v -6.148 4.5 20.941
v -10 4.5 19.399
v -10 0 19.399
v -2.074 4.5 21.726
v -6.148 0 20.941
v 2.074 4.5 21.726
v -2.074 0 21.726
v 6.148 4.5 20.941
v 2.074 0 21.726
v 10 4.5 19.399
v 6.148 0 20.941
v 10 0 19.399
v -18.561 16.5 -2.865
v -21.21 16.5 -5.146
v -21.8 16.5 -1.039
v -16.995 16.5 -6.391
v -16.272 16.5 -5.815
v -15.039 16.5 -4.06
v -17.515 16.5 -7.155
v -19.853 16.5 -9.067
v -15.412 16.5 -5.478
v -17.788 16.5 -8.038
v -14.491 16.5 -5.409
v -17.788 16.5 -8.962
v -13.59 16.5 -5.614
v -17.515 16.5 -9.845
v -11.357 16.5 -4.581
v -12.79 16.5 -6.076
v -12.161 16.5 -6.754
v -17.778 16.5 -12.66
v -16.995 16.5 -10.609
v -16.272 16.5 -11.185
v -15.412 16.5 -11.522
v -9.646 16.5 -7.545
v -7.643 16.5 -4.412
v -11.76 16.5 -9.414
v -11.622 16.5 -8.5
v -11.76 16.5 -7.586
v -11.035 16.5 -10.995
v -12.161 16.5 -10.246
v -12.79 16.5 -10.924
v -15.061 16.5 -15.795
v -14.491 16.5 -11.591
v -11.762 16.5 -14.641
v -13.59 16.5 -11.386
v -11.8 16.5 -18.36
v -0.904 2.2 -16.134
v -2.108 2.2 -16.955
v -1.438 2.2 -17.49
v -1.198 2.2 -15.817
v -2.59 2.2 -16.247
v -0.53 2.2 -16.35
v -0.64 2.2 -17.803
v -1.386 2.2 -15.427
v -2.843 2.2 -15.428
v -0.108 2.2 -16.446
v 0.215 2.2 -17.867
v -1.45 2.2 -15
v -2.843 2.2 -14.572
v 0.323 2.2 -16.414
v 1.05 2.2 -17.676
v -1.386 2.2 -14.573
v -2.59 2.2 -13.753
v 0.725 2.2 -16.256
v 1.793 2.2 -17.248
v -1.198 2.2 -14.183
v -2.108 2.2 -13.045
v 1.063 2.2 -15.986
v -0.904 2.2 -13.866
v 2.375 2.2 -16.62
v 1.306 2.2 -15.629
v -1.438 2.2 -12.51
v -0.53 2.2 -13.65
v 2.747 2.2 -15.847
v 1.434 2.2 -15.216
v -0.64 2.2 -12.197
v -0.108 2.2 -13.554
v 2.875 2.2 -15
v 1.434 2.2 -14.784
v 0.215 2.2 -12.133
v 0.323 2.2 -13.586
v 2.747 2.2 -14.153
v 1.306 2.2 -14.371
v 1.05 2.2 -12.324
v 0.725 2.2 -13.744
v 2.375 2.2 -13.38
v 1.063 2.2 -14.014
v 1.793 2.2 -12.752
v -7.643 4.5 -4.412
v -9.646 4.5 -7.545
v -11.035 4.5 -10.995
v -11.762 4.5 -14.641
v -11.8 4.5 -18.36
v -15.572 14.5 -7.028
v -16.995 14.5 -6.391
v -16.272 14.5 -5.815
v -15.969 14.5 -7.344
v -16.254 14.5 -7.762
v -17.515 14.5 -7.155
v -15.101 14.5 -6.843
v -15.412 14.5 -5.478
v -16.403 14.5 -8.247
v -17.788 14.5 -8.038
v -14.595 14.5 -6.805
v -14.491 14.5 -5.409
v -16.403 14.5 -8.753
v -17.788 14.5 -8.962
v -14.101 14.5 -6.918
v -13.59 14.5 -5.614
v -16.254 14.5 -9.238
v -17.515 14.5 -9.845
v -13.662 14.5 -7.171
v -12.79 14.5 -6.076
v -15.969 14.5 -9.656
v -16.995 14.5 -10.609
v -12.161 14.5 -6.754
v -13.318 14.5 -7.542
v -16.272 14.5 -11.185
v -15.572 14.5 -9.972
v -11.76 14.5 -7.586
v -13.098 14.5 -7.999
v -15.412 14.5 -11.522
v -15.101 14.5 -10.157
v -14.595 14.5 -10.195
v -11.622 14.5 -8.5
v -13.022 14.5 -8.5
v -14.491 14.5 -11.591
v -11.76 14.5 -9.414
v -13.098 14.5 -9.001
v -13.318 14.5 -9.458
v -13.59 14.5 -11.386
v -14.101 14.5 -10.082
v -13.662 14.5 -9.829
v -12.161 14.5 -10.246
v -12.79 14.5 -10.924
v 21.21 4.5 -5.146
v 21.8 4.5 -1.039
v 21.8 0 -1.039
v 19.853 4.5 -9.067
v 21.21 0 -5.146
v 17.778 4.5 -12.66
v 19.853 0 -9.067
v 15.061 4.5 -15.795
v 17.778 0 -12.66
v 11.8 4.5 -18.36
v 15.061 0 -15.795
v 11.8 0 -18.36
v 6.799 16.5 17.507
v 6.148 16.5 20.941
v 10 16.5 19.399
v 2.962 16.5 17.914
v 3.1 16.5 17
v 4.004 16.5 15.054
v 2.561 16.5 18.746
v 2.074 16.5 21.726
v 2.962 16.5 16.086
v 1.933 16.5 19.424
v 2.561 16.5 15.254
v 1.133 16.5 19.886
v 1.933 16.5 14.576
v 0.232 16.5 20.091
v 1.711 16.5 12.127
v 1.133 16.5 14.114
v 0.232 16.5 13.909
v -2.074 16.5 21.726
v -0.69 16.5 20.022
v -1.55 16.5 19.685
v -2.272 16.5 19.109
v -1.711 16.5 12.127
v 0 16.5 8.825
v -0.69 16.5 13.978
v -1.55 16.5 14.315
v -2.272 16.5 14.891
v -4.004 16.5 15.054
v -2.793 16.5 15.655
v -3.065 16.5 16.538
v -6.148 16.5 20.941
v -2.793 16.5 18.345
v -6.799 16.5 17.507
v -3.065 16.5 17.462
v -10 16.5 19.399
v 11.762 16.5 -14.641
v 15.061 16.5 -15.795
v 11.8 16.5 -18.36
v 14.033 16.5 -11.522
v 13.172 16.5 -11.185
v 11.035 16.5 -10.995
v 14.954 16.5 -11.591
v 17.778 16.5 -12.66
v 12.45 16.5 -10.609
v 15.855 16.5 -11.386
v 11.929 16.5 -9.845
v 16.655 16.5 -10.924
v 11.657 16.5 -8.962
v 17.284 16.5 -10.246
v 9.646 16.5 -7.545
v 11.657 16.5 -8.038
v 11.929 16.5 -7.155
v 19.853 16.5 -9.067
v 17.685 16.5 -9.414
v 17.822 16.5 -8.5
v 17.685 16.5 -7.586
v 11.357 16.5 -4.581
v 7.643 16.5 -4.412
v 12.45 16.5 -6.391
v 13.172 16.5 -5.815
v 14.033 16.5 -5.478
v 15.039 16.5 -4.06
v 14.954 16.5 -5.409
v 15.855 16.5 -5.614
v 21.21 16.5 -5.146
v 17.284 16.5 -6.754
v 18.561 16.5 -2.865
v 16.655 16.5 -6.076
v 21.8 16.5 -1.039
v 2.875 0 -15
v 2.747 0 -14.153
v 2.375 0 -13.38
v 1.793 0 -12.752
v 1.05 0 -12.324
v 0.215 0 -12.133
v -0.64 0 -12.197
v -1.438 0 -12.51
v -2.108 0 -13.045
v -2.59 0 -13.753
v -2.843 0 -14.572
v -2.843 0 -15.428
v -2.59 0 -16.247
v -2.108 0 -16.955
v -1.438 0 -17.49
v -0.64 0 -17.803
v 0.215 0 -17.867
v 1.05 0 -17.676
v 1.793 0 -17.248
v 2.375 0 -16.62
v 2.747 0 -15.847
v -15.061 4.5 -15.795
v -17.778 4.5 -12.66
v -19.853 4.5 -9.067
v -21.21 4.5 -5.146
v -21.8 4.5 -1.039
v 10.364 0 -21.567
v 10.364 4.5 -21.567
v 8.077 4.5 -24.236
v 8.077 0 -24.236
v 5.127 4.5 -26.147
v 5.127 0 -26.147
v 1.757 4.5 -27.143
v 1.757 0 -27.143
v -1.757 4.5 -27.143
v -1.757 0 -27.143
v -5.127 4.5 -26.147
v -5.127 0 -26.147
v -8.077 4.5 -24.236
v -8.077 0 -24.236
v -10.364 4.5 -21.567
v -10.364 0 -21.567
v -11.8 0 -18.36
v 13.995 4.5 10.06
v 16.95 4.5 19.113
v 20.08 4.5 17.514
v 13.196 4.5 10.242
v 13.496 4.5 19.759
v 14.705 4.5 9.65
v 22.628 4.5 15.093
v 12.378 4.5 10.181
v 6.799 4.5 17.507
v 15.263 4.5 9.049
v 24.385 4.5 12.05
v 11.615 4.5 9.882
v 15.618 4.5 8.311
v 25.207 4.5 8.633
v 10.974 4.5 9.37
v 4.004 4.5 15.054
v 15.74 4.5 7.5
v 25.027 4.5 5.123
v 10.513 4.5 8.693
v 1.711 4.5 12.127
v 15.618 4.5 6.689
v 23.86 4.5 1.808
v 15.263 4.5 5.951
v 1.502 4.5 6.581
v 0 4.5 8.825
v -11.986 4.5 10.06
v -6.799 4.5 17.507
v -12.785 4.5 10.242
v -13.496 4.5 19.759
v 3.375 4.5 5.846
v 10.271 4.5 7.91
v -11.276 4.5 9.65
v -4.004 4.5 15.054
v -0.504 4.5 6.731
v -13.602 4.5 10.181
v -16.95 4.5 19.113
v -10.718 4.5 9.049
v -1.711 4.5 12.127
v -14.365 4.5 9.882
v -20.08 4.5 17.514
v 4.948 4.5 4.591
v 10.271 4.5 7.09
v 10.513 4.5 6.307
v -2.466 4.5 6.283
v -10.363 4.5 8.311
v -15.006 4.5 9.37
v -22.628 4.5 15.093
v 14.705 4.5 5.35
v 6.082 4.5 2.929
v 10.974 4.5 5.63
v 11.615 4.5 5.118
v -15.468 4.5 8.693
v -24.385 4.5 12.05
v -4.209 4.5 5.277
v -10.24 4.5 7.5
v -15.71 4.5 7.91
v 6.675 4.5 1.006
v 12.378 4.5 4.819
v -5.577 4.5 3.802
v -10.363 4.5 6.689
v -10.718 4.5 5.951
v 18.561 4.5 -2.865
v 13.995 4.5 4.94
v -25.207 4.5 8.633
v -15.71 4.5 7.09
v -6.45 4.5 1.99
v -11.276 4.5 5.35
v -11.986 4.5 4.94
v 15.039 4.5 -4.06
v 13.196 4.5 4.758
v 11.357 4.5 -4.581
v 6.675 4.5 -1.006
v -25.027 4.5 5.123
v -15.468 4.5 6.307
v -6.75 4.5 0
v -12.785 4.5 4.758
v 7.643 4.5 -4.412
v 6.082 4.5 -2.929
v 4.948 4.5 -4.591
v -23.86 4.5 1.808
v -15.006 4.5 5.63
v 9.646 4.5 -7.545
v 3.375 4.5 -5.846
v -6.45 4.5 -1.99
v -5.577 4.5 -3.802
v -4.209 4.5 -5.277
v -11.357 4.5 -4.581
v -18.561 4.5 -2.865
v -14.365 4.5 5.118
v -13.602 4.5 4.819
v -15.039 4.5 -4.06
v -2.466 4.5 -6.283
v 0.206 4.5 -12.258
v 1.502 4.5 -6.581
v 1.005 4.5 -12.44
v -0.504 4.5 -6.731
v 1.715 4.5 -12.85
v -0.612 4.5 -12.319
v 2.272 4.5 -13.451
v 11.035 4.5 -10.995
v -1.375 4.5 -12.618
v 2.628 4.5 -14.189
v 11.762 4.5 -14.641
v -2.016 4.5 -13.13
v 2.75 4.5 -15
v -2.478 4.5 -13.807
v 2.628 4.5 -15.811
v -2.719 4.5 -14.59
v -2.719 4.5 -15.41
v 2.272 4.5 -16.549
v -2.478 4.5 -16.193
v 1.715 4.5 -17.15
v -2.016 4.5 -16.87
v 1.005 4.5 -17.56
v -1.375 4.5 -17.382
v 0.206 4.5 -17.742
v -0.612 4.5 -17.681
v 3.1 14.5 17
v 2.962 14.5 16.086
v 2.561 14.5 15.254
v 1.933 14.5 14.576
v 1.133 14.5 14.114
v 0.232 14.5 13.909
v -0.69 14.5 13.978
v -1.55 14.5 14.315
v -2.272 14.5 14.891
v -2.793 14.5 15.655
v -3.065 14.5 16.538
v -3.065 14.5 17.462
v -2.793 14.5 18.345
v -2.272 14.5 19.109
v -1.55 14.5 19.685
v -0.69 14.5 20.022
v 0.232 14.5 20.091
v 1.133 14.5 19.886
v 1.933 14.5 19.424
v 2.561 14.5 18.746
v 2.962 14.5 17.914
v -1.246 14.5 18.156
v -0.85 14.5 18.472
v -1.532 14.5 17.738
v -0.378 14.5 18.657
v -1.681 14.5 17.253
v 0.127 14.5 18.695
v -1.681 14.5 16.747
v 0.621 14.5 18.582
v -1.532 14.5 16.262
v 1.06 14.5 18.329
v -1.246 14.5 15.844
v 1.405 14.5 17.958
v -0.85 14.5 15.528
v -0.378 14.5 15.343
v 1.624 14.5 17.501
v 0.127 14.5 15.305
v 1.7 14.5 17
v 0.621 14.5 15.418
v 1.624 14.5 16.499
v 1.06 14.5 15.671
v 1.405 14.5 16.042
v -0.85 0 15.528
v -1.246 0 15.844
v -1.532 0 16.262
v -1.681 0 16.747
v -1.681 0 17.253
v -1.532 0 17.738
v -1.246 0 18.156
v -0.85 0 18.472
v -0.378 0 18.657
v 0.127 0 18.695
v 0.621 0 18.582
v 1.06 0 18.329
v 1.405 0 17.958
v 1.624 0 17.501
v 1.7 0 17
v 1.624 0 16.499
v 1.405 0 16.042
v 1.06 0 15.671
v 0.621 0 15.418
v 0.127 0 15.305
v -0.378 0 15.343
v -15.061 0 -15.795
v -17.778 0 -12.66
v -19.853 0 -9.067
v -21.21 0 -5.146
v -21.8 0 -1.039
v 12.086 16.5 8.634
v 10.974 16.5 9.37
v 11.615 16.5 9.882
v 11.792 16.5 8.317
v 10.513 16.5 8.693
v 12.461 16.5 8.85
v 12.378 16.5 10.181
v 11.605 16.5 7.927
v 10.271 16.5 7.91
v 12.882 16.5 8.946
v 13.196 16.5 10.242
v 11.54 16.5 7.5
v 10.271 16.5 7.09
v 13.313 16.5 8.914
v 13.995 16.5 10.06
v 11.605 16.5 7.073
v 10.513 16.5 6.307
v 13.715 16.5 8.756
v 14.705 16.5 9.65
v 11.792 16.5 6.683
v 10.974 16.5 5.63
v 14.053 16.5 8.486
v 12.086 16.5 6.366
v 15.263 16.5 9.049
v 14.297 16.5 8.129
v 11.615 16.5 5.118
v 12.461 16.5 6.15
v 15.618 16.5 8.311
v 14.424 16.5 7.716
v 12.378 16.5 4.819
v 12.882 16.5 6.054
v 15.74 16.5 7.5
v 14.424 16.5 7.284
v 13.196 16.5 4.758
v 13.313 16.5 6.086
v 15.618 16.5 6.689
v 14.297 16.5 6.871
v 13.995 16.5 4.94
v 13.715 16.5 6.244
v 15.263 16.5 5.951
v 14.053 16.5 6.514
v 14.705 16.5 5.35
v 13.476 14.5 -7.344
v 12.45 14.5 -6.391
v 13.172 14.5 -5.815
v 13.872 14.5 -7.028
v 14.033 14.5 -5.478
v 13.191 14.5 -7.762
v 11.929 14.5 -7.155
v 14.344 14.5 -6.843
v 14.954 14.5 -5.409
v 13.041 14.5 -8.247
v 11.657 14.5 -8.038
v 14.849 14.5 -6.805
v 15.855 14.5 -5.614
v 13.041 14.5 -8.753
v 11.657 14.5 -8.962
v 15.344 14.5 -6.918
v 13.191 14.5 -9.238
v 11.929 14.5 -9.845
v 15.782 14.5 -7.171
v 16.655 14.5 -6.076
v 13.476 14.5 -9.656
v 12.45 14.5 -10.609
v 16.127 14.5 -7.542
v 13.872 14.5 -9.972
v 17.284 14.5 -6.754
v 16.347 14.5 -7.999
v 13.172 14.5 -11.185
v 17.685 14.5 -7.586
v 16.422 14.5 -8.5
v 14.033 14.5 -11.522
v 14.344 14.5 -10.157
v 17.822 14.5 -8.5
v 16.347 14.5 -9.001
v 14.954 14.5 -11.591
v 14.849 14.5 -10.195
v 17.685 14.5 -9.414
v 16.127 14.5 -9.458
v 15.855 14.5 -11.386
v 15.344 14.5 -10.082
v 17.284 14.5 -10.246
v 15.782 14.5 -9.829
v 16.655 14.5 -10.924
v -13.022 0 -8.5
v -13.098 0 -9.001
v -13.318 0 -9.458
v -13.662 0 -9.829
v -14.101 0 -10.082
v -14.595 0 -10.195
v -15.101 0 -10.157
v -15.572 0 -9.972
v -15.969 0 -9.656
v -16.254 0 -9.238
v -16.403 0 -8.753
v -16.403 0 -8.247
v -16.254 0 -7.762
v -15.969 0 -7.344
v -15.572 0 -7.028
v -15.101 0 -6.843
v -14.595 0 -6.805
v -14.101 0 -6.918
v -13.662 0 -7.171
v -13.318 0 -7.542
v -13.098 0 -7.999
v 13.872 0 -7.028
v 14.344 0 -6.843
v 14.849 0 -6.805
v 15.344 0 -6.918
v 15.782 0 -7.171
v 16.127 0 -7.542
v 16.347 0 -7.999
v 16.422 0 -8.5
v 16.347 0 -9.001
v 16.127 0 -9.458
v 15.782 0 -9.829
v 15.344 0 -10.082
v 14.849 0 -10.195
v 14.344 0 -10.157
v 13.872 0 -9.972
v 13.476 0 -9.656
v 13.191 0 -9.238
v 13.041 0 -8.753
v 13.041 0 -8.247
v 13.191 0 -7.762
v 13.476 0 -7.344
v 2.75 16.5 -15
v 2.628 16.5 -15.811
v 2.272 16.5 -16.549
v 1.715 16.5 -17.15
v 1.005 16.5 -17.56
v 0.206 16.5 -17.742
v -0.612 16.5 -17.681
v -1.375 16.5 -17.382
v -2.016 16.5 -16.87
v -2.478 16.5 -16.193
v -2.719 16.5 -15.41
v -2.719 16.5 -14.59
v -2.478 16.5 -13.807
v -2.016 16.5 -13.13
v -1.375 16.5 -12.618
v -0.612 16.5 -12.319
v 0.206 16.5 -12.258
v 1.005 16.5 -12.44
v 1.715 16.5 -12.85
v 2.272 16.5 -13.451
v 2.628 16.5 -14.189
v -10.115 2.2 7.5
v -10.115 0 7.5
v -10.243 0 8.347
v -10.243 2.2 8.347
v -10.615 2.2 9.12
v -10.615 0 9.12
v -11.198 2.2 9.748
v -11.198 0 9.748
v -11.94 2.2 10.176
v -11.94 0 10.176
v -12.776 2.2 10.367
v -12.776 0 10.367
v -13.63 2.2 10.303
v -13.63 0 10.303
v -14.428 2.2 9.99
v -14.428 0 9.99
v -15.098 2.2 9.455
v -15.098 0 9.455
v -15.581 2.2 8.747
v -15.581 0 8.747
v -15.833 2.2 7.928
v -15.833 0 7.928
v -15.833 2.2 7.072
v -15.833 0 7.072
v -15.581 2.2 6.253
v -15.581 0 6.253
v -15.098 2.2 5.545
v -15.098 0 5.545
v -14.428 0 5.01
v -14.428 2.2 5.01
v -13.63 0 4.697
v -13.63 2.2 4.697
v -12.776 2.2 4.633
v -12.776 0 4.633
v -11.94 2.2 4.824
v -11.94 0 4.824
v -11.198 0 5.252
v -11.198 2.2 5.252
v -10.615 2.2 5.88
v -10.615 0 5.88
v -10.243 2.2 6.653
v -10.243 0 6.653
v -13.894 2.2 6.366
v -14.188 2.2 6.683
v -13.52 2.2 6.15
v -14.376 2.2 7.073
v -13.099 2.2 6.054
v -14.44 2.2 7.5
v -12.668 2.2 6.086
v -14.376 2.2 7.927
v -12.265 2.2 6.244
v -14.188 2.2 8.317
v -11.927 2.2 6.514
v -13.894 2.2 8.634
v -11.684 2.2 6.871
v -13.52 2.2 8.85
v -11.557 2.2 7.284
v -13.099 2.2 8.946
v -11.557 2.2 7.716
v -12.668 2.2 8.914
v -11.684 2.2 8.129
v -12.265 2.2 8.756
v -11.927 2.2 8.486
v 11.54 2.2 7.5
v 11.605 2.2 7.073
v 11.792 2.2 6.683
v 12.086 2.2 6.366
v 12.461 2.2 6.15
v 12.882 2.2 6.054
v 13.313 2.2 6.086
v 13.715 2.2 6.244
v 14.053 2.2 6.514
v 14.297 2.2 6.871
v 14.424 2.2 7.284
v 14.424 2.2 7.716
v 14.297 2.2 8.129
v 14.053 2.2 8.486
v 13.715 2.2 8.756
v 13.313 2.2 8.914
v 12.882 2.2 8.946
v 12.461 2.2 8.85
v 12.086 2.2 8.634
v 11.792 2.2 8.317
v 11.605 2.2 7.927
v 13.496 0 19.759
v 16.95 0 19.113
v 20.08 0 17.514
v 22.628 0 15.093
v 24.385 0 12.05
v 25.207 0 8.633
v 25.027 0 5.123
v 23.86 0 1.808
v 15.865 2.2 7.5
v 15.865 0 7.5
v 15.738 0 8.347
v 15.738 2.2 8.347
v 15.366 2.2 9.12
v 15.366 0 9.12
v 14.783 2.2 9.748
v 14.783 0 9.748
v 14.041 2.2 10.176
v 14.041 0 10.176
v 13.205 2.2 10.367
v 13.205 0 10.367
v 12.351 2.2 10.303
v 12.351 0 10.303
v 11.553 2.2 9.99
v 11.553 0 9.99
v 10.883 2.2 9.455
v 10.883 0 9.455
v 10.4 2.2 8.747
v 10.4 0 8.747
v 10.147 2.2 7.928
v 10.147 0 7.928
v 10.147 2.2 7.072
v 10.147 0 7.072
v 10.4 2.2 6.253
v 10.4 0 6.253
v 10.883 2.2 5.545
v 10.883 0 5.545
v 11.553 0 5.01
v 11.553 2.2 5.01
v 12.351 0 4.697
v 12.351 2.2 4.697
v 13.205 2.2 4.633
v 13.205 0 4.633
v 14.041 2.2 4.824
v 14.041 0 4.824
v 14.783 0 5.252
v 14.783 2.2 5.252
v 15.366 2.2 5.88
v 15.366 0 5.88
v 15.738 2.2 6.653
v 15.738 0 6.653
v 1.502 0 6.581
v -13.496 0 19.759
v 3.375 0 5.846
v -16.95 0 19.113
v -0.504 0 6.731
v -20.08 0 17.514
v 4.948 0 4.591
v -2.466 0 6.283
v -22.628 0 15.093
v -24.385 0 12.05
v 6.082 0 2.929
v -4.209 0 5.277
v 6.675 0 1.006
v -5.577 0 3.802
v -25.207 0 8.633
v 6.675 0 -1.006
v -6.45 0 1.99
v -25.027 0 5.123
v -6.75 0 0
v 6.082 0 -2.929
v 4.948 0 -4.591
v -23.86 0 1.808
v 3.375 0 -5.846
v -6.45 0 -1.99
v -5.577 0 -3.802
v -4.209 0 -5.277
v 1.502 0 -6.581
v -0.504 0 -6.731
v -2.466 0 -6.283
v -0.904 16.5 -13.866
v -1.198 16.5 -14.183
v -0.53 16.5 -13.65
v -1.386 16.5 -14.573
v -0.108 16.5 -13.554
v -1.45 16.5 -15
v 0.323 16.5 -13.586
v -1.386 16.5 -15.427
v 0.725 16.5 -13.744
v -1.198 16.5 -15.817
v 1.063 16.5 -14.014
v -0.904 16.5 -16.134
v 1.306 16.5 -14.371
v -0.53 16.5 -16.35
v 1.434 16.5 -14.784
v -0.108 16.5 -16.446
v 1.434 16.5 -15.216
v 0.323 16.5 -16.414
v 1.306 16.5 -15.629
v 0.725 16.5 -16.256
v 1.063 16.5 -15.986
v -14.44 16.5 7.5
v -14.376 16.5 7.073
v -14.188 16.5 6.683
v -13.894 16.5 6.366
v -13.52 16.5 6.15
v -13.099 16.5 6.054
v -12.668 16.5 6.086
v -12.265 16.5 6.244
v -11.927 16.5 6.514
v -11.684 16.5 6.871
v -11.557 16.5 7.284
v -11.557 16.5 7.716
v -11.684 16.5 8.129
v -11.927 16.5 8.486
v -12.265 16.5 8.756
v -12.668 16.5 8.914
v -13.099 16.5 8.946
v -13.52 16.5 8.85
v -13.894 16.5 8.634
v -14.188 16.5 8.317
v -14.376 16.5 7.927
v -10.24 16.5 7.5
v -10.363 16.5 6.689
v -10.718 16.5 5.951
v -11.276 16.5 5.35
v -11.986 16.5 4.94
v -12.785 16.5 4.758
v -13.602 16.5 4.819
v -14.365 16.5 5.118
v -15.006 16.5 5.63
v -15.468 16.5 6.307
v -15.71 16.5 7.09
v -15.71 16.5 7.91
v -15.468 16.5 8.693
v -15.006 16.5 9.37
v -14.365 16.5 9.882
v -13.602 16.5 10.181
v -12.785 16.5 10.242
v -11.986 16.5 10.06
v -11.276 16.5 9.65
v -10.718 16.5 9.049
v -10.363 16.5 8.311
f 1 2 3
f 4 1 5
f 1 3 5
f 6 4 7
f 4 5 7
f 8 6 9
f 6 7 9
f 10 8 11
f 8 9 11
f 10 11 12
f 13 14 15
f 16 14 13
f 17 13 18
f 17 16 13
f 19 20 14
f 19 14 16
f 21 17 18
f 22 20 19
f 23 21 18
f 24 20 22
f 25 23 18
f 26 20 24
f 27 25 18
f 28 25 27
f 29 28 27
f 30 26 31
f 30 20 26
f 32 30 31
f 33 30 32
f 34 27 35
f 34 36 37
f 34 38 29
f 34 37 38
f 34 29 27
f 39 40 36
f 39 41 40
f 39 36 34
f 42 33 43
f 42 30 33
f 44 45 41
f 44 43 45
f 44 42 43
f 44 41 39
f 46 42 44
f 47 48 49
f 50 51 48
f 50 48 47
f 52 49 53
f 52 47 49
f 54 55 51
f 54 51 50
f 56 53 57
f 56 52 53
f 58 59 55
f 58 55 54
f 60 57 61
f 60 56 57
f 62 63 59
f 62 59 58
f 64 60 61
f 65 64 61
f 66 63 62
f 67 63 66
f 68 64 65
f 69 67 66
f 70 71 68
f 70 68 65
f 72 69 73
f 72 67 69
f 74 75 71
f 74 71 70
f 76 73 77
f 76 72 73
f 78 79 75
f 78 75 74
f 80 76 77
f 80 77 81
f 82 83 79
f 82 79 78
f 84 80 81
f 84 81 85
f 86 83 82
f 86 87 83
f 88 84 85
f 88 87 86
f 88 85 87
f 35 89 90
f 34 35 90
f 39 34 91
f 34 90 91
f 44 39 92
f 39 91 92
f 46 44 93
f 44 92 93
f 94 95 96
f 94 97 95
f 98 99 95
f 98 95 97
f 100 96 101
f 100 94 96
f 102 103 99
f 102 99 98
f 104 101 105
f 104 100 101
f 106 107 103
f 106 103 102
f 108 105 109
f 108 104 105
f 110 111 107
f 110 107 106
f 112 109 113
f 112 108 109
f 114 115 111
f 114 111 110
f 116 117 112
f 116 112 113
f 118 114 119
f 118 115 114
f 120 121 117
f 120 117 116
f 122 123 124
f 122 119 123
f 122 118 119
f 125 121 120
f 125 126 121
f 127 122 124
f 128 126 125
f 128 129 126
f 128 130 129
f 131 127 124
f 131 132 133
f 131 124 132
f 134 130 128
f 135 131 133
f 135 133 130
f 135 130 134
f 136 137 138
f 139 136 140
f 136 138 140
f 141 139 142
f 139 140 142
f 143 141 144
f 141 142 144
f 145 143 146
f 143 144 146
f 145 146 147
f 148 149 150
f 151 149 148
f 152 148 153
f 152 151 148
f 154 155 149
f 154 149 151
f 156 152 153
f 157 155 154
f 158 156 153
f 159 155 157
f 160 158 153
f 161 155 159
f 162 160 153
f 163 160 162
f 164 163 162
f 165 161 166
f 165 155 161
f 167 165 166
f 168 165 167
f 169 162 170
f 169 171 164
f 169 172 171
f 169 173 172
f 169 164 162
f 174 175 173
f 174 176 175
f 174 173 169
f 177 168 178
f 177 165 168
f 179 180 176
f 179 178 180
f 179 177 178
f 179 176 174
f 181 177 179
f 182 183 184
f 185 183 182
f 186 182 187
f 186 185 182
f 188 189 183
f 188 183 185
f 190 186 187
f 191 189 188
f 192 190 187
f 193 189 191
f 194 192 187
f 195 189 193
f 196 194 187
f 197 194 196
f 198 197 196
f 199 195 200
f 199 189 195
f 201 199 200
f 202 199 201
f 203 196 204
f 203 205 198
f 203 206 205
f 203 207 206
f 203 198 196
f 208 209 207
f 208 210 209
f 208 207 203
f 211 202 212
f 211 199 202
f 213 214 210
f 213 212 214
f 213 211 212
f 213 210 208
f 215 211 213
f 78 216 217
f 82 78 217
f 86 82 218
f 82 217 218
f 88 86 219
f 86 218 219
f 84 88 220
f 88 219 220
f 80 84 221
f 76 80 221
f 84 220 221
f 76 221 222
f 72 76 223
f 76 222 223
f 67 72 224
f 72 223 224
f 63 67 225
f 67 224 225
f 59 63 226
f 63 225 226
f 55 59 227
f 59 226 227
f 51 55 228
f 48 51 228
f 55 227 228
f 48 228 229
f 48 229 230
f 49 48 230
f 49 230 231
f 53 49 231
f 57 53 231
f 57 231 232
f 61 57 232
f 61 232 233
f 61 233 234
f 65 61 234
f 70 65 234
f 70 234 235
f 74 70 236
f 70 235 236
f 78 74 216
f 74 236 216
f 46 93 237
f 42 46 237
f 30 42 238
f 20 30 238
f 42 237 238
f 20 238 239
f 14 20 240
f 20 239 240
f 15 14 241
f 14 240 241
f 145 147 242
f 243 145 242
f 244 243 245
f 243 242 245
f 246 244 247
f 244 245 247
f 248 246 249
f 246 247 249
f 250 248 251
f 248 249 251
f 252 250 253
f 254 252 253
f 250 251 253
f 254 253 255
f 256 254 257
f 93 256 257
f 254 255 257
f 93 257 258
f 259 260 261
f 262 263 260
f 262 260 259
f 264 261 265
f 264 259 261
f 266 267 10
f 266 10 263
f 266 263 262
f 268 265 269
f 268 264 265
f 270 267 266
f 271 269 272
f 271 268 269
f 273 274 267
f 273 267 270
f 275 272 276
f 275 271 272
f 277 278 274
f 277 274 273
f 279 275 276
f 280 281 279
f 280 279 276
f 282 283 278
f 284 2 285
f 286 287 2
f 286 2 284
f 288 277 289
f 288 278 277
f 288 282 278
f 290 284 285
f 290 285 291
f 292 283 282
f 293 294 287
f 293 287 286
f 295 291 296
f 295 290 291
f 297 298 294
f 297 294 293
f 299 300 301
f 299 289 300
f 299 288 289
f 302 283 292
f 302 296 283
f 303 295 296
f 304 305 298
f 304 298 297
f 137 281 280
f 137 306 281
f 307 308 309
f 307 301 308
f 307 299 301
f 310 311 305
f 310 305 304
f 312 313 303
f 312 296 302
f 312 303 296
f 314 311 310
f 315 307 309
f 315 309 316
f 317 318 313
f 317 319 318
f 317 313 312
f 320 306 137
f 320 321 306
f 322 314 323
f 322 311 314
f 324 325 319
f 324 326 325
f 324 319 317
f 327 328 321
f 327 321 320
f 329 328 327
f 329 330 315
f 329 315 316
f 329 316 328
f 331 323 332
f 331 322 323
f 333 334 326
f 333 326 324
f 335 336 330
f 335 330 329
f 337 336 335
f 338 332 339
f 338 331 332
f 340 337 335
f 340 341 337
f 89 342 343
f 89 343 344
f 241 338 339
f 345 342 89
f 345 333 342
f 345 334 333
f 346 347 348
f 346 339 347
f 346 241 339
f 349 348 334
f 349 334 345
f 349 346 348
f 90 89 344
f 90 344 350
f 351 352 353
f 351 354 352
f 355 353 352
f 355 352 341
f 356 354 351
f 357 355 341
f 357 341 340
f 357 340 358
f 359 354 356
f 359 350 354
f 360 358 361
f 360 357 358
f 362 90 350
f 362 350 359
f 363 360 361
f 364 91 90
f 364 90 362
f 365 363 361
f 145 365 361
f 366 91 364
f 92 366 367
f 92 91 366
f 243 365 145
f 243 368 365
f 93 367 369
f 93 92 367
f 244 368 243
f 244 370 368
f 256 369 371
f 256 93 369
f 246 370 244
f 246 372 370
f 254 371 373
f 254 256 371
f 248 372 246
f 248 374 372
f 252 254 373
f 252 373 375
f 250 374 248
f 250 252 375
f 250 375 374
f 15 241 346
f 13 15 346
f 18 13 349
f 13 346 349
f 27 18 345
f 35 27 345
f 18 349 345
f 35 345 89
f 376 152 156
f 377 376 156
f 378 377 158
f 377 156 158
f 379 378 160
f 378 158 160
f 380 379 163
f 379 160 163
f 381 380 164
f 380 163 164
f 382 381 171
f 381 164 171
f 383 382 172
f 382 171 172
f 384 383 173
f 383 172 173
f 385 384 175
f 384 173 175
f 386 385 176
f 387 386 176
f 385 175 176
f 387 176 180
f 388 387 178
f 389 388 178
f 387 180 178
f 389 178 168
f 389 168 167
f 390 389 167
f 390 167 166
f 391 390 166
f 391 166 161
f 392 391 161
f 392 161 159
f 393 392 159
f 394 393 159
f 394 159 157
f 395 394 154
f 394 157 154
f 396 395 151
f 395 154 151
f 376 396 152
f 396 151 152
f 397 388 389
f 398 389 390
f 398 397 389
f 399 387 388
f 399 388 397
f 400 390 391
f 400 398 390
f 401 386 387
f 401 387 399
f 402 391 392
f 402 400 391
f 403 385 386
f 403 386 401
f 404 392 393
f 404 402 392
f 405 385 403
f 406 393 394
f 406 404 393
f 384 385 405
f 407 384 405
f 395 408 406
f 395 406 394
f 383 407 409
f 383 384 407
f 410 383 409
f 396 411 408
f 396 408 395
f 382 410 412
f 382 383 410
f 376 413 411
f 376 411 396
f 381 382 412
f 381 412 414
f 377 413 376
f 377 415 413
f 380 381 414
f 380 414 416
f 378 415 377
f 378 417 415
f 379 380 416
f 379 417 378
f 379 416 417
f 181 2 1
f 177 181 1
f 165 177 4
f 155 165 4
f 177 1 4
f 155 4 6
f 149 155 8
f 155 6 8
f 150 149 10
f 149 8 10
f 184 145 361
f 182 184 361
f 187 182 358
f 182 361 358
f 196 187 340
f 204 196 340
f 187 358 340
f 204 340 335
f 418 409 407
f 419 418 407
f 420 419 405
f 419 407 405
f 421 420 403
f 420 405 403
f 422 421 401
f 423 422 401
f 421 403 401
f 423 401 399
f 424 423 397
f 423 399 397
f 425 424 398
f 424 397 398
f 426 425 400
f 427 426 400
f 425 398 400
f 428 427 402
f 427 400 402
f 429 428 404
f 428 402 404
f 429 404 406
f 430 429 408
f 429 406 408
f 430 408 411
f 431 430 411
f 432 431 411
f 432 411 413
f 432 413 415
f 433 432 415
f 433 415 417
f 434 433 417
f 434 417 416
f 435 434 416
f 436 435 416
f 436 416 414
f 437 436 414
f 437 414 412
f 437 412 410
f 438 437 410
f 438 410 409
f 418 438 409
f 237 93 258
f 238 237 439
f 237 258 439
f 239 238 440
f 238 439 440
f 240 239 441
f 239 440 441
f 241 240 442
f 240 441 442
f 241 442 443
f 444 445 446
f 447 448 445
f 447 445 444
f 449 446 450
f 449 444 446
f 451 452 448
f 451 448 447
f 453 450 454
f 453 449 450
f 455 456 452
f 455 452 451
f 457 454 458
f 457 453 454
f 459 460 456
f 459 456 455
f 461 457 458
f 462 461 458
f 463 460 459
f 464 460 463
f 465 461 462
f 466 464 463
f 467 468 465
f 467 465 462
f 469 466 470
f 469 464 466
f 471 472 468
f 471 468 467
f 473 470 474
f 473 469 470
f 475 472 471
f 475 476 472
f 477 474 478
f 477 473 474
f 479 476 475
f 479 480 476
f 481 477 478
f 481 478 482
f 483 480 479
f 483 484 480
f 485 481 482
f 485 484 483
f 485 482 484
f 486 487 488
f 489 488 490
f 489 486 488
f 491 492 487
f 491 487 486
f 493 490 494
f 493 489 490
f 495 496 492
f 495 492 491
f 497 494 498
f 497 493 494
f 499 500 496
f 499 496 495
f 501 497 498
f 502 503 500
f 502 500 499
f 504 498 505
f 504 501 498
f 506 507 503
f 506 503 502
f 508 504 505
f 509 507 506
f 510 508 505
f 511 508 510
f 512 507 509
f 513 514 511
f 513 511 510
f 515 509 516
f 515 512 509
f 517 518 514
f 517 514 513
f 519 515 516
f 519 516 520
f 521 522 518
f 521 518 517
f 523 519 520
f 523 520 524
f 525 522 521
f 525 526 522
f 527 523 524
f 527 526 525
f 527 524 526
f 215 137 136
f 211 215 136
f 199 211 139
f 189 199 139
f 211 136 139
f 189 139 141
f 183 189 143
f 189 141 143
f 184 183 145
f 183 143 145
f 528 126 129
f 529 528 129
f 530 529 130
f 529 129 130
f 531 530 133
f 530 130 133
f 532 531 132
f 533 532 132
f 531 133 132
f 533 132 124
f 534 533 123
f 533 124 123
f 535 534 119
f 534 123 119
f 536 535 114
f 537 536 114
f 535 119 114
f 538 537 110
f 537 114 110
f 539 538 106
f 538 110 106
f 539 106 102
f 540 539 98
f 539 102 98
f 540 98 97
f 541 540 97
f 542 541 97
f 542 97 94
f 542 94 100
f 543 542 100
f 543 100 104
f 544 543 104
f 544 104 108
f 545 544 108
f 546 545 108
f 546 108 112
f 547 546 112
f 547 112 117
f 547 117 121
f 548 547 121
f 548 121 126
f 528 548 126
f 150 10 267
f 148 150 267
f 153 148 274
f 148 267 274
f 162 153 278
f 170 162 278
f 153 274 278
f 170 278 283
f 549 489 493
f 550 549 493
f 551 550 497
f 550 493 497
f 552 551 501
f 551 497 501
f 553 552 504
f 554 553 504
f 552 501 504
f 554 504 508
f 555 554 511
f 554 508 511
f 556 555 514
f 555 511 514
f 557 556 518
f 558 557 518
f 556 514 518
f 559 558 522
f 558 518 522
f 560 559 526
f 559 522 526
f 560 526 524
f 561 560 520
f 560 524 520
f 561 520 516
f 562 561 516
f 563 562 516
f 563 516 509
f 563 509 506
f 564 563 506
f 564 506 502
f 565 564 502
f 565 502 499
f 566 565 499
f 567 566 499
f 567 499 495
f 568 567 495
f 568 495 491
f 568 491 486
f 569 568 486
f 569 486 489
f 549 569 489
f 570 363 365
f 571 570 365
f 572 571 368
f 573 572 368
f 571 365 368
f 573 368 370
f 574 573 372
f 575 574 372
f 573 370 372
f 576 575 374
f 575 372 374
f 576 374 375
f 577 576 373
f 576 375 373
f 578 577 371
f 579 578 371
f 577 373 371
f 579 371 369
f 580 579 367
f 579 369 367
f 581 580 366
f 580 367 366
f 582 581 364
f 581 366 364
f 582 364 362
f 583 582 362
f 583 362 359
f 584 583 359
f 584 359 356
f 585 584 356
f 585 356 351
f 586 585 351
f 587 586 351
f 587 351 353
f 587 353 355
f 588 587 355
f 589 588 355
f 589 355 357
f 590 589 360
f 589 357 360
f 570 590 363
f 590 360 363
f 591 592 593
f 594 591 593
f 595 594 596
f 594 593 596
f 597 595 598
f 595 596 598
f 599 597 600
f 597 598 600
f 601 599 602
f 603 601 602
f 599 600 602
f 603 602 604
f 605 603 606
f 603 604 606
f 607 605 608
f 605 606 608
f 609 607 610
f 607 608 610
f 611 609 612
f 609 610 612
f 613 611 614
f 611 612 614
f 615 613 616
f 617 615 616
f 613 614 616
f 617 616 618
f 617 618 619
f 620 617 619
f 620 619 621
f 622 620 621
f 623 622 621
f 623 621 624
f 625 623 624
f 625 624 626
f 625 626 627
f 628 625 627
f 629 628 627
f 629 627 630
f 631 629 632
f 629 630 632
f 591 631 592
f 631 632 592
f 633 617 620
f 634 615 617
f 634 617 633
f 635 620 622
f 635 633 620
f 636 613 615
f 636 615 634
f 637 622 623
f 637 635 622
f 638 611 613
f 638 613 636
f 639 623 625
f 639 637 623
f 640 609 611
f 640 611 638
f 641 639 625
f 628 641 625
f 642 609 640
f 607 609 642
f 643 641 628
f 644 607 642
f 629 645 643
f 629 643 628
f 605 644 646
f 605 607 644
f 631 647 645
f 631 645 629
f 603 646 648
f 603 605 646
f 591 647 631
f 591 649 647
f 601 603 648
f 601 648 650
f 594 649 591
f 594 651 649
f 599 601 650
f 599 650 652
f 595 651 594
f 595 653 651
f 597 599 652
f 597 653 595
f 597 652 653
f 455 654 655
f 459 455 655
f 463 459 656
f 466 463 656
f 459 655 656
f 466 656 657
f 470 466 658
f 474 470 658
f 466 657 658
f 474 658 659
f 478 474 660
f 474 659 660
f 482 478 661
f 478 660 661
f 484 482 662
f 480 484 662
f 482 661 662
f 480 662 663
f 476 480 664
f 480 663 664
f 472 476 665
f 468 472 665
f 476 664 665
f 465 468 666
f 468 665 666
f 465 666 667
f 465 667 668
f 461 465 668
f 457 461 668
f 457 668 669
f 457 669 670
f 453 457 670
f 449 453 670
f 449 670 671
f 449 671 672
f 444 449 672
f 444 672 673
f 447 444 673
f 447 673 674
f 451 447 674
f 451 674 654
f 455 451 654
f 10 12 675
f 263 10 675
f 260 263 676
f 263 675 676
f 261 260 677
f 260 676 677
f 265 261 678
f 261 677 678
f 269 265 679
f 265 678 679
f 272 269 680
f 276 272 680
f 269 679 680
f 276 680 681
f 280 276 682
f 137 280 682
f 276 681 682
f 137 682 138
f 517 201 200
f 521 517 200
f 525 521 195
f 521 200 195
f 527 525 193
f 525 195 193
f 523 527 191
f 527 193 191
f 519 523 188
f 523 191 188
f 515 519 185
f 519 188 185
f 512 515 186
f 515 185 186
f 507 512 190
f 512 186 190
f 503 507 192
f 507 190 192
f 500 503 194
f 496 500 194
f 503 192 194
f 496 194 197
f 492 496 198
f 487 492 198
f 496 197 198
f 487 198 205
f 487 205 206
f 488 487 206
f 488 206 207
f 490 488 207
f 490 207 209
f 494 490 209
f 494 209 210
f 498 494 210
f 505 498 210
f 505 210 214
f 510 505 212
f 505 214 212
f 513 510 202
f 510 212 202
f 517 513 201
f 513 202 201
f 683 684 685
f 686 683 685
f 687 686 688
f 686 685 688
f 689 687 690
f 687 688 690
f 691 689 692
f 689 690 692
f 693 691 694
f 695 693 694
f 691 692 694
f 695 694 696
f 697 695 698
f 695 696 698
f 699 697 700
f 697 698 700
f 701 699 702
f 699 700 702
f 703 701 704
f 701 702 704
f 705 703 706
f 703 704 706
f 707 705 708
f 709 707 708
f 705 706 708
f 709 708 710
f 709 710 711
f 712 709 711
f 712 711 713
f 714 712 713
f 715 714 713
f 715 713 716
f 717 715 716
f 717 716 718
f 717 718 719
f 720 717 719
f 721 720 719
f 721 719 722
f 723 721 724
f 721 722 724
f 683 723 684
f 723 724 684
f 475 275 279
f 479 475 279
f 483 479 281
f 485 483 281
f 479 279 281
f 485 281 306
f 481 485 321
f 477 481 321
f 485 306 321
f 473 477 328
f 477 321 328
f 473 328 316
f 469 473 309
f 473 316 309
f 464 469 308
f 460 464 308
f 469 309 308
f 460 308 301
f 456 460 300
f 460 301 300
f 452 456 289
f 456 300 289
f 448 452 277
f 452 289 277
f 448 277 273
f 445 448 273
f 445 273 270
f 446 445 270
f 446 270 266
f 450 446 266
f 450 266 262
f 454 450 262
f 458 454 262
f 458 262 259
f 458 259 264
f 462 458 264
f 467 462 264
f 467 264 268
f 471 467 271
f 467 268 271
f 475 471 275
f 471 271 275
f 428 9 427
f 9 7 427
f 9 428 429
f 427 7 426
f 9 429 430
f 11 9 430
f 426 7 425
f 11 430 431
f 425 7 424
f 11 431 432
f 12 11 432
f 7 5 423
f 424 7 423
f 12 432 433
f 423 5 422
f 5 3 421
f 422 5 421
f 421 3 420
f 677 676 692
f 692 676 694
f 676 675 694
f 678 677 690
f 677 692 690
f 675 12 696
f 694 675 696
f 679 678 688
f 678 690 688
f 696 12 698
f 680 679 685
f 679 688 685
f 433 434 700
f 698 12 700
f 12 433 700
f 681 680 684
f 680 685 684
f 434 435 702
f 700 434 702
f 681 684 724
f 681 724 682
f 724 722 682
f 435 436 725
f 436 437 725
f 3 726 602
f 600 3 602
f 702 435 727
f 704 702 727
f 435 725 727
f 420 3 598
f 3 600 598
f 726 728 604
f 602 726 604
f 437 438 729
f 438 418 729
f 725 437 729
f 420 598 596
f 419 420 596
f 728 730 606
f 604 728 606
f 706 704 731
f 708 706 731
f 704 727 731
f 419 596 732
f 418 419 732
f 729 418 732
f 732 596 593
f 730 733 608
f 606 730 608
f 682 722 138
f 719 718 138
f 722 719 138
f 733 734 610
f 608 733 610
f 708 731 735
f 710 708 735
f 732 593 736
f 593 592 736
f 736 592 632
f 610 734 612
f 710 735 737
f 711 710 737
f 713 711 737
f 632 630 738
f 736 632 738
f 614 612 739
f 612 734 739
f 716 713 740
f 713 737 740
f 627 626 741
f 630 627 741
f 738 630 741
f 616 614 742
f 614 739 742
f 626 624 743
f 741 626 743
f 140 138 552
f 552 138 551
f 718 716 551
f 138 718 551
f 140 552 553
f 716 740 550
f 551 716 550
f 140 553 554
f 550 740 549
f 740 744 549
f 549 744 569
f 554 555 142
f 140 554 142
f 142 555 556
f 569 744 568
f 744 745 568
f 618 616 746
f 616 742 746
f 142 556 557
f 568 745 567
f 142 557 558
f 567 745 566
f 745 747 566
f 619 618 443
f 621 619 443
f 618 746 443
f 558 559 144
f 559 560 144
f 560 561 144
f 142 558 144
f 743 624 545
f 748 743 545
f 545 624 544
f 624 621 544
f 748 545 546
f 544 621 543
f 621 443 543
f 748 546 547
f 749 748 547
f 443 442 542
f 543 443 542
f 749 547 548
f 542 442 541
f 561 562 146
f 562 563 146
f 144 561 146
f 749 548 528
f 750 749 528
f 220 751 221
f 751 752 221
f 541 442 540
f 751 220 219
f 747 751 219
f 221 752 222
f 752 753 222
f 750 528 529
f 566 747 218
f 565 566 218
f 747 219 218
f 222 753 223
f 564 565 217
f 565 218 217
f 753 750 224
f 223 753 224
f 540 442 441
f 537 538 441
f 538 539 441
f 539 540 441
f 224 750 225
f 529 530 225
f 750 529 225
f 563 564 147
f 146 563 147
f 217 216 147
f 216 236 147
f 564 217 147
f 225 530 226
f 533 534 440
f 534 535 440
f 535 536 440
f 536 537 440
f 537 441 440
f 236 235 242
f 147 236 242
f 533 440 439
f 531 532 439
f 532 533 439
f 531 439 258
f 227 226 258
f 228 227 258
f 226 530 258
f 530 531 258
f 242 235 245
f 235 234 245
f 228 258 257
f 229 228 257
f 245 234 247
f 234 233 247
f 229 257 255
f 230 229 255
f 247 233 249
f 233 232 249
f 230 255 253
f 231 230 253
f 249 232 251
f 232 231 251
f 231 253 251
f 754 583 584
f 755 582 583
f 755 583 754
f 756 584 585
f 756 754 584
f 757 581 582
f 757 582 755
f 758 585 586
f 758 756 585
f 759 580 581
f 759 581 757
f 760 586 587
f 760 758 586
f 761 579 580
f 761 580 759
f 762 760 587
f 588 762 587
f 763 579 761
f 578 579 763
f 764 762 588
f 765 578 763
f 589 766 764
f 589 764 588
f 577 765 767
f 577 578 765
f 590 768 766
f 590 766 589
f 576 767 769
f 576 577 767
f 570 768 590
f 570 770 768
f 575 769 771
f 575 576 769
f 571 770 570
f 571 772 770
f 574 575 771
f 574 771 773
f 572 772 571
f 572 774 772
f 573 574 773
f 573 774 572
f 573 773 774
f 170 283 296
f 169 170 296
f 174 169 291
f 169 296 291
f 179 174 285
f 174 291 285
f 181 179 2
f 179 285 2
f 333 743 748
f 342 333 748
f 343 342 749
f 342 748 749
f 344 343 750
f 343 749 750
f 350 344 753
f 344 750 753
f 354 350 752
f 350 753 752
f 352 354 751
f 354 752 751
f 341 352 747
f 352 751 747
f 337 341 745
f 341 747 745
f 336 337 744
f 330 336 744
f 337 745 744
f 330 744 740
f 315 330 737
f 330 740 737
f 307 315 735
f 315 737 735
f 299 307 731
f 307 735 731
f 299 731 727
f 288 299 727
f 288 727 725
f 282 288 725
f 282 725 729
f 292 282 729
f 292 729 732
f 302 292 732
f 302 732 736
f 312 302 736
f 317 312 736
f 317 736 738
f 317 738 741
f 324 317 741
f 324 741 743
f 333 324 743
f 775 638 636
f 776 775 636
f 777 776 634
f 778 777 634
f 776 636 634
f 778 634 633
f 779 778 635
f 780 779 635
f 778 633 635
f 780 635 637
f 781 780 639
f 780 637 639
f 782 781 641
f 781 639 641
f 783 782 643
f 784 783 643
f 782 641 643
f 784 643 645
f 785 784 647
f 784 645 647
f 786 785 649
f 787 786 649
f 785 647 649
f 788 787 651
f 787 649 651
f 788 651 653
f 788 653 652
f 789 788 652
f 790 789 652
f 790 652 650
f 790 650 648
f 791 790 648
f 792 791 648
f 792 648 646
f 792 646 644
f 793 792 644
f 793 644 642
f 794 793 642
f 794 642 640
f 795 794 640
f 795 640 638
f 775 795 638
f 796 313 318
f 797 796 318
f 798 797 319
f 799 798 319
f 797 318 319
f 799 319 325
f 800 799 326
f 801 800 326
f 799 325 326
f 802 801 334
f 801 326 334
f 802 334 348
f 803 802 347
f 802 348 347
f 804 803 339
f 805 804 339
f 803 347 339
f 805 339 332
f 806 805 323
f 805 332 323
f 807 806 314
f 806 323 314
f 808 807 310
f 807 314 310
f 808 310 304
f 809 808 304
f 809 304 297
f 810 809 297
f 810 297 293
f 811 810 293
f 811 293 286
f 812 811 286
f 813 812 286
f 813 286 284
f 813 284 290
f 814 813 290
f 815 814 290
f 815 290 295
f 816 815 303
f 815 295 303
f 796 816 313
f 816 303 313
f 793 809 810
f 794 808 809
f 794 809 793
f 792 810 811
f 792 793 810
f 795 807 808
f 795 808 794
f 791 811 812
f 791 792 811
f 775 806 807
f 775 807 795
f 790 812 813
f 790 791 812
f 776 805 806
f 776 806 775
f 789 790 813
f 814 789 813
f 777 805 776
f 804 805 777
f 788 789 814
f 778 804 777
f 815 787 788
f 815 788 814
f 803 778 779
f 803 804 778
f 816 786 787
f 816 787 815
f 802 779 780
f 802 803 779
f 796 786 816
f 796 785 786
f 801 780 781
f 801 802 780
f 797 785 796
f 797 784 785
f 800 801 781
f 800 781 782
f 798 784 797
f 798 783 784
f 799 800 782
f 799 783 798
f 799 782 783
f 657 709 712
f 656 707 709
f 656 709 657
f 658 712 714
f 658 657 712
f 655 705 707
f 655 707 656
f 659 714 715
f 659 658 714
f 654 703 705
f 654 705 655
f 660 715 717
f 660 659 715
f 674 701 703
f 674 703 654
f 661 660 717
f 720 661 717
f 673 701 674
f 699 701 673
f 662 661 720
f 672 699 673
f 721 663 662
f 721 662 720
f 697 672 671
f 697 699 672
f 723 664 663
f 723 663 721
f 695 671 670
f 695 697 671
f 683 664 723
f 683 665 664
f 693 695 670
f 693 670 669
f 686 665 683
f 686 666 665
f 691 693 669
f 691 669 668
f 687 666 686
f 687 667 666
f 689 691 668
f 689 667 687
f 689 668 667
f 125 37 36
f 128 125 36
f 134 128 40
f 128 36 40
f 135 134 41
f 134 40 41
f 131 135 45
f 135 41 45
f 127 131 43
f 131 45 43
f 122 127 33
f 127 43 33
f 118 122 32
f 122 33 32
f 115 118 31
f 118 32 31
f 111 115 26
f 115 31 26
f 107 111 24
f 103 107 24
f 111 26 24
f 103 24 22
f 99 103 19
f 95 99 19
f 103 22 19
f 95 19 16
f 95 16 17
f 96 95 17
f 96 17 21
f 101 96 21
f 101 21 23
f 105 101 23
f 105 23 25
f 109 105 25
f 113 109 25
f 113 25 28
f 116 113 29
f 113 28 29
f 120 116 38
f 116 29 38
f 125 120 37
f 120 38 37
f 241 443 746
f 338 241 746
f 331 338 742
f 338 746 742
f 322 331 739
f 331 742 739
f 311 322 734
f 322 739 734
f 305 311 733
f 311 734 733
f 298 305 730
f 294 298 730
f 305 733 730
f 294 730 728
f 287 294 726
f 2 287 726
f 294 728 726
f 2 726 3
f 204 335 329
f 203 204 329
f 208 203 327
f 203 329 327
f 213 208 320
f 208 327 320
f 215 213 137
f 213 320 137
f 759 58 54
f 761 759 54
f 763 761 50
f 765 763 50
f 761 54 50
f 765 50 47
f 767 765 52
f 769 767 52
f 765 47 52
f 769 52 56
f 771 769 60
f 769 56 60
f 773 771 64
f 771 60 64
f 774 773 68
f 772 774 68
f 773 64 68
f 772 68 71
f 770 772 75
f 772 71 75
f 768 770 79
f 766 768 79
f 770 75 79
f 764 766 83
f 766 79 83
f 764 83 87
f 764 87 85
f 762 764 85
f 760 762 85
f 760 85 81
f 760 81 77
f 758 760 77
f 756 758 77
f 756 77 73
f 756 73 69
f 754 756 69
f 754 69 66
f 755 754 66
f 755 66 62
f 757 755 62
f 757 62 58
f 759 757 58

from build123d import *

# Parameters (mm, degrees)
CROQUIS1_R                     = 21.825
SALIENTE_EXTRUIR1_DEPTH        = 4.5
CROQUIS2_R                     = 2.75
SALIENTE_EXTRUIR2_DEPTH        = 12
TALADRO_DE_MARGEN_PARA_M121_D  = 13.5
SALIENTE_EXTRUIR3_DEPTH        = 12
CROQUIS8_R                     = 1.7
CORTAR_EXTRUIR1_DEPTH          = 16.5
MATRIZC1_COUNT                 = 3
TALADRO_DE_MARGEN_PARA_M2_51_D = 2.9
SALIENTE_EXTRUIR5_DEPTH        = 4.5
MATRIZC2_COUNT                 = 3
CROQUIS12_R                    = 2.875
CORTAR_EXTRUIR2_DEPTH          = 2.2
CROQUIS13_R                    = 3.1
CORTAR_EXTRUIR3_DEPTH          = 2


with BuildPart() as part:
    # Croquis1 → Saliente-Extruir1 (new body)
    with BuildSketch(Plane(origin=(0, 0, 0), x_dir=(1, 0, 0), z_dir=(0, 1, 0))):
        Circle(CROQUIS1_R)
    extrude(amount=SALIENTE_EXTRUIR1_DEPTH)

    # Croquis2 → Saliente-Extruir2 (add)
    with BuildSketch(Plane(origin=(0, 4.5, 0), x_dir=(1, 0, 0), z_dir=(0, 1, 0))):
        with Locations((0, 15)):
            Circle(CROQUIS2_R)
        with Locations((12.990381057, -7.5)):
            Circle(CROQUIS2_R)
        with Locations((-12.990381057, -7.5)):
            Circle(CROQUIS2_R)
    extrude(amount=SALIENTE_EXTRUIR2_DEPTH)

    # Taladro de margen para M121 (through all)
    with Locations(Plane(origin=(0, 4.5, 0), x_dir=(1, 0, 0), z_dir=(0, 1, 0))):
        with Locations((0, 0)):
            Hole(TALADRO_DE_MARGEN_PARA_M121_D / 2)

    # Croquis5 → Saliente-Extruir3 (add)
    with BuildSketch(Plane(origin=(0, 4.5, 0), x_dir=(1, 0, 0), z_dir=(0, 1, 0))):
        with BuildLine():
            ThreePointArc((-7.642674188, 4.4125), (-11.035446071, 10.994501306), (-11.800237164, 18.359875487))
            ThreePointArc((-11.800237164, 18.359875487), (-18.901004438, 10.9125), (-21.800237164, 1.039367411))
            ThreePointArc((-21.800237164, 1.039367411), (-15.039240468, 4.059725986), (-7.642674188, 4.4125))
        make_face()
    saliente_extruir3 = extrude(amount=SALIENTE_EXTRUIR3_DEPTH)

    # Croquis8 → Cortar-Extruir1 (cut)
    with BuildSketch(Plane(origin=(0, 16.5, 0), x_dir=(1, 0, 0), z_dir=(0, 1, 0))):
        with Locations((-14.722431864, 8.5)):
            Circle(CROQUIS8_R)
    cortar_extruir1 = extrude(amount=-CORTAR_EXTRUIR1_DEPTH, mode=Mode.SUBTRACT)

    # MatrizC1: Saliente-Extruir3, Cortar-Extruir1 ×3 about axis
    matrizc1_axis = Axis((0, 0, 0), (0, 1, 0))
    for i in range(1, MATRIZC1_COUNT):
        add(saliente_extruir3.rotate(matrizc1_axis, i * 360 / MATRIZC1_COUNT))
        add(cortar_extruir1.rotate(matrizc1_axis, i * 360 / MATRIZC1_COUNT), mode=Mode.SUBTRACT)

    # Taladro de margen para M2.51 (through all)
    with Locations(Plane(origin=(0, 16.5, 0), x_dir=(1, 0, 0), z_dir=(0, 1, 0))):
        with Locations((12.990381057, -7.5), (-12.990381057, -7.5), (0, 15)):
            Hole(TALADRO_DE_MARGEN_PARA_M2_51_D / 2)

    # Croquis11 → Saliente-Extruir5 (add)
    with BuildSketch(Plane.XZ):
        with BuildLine():
            ThreePointArc((-10, 19.399242898), (-18.901004438, 10.9125), (-21.800237164, -1.039367411))
            ThreePointArc((-21.800237164, -1.039367411), (-23.615858472, 13.634622246), (-10, 19.399242898))
        make_face()
    saliente_extruir5 = extrude(amount=-SALIENTE_EXTRUIR5_DEPTH)

    # MatrizC2: Saliente-Extruir5 ×3 about axis
    matrizc2_axis = Axis((0, 0, 0), (0, 1, 0))
    for i in range(1, MATRIZC2_COUNT):
        add(saliente_extruir5.rotate(matrizc2_axis, i * 360 / MATRIZC2_COUNT))

    # Croquis12 → Cortar-Extruir2 (cut)
    with BuildSketch(Plane.XZ):
        with Locations((-12.990381057, 7.5)):
            Circle(CROQUIS12_R)
        with Locations((12.990381057, 7.5)):
            Circle(CROQUIS12_R)
        with Locations((0, -15)):
            Circle(CROQUIS12_R)
    extrude(amount=-CORTAR_EXTRUIR2_DEPTH, mode=Mode.SUBTRACT)

    # Croquis13 → Cortar-Extruir3 (cut)
    with BuildSketch(Plane(origin=(0, 16.5, 0), x_dir=(1, 0, 0), z_dir=(0, 1, 0))):
        with Locations((0, -17)):
            Circle(CROQUIS13_R)
        with Locations((-14.722431864, 8.5)):
            Circle(CROQUIS13_R)
        with Locations((14.722431864, 8.5)):
            Circle(CROQUIS13_R)
    extrude(amount=-CORTAR_EXTRUIR3_DEPTH, mode=Mode.SUBTRACT)


solid = part.part
